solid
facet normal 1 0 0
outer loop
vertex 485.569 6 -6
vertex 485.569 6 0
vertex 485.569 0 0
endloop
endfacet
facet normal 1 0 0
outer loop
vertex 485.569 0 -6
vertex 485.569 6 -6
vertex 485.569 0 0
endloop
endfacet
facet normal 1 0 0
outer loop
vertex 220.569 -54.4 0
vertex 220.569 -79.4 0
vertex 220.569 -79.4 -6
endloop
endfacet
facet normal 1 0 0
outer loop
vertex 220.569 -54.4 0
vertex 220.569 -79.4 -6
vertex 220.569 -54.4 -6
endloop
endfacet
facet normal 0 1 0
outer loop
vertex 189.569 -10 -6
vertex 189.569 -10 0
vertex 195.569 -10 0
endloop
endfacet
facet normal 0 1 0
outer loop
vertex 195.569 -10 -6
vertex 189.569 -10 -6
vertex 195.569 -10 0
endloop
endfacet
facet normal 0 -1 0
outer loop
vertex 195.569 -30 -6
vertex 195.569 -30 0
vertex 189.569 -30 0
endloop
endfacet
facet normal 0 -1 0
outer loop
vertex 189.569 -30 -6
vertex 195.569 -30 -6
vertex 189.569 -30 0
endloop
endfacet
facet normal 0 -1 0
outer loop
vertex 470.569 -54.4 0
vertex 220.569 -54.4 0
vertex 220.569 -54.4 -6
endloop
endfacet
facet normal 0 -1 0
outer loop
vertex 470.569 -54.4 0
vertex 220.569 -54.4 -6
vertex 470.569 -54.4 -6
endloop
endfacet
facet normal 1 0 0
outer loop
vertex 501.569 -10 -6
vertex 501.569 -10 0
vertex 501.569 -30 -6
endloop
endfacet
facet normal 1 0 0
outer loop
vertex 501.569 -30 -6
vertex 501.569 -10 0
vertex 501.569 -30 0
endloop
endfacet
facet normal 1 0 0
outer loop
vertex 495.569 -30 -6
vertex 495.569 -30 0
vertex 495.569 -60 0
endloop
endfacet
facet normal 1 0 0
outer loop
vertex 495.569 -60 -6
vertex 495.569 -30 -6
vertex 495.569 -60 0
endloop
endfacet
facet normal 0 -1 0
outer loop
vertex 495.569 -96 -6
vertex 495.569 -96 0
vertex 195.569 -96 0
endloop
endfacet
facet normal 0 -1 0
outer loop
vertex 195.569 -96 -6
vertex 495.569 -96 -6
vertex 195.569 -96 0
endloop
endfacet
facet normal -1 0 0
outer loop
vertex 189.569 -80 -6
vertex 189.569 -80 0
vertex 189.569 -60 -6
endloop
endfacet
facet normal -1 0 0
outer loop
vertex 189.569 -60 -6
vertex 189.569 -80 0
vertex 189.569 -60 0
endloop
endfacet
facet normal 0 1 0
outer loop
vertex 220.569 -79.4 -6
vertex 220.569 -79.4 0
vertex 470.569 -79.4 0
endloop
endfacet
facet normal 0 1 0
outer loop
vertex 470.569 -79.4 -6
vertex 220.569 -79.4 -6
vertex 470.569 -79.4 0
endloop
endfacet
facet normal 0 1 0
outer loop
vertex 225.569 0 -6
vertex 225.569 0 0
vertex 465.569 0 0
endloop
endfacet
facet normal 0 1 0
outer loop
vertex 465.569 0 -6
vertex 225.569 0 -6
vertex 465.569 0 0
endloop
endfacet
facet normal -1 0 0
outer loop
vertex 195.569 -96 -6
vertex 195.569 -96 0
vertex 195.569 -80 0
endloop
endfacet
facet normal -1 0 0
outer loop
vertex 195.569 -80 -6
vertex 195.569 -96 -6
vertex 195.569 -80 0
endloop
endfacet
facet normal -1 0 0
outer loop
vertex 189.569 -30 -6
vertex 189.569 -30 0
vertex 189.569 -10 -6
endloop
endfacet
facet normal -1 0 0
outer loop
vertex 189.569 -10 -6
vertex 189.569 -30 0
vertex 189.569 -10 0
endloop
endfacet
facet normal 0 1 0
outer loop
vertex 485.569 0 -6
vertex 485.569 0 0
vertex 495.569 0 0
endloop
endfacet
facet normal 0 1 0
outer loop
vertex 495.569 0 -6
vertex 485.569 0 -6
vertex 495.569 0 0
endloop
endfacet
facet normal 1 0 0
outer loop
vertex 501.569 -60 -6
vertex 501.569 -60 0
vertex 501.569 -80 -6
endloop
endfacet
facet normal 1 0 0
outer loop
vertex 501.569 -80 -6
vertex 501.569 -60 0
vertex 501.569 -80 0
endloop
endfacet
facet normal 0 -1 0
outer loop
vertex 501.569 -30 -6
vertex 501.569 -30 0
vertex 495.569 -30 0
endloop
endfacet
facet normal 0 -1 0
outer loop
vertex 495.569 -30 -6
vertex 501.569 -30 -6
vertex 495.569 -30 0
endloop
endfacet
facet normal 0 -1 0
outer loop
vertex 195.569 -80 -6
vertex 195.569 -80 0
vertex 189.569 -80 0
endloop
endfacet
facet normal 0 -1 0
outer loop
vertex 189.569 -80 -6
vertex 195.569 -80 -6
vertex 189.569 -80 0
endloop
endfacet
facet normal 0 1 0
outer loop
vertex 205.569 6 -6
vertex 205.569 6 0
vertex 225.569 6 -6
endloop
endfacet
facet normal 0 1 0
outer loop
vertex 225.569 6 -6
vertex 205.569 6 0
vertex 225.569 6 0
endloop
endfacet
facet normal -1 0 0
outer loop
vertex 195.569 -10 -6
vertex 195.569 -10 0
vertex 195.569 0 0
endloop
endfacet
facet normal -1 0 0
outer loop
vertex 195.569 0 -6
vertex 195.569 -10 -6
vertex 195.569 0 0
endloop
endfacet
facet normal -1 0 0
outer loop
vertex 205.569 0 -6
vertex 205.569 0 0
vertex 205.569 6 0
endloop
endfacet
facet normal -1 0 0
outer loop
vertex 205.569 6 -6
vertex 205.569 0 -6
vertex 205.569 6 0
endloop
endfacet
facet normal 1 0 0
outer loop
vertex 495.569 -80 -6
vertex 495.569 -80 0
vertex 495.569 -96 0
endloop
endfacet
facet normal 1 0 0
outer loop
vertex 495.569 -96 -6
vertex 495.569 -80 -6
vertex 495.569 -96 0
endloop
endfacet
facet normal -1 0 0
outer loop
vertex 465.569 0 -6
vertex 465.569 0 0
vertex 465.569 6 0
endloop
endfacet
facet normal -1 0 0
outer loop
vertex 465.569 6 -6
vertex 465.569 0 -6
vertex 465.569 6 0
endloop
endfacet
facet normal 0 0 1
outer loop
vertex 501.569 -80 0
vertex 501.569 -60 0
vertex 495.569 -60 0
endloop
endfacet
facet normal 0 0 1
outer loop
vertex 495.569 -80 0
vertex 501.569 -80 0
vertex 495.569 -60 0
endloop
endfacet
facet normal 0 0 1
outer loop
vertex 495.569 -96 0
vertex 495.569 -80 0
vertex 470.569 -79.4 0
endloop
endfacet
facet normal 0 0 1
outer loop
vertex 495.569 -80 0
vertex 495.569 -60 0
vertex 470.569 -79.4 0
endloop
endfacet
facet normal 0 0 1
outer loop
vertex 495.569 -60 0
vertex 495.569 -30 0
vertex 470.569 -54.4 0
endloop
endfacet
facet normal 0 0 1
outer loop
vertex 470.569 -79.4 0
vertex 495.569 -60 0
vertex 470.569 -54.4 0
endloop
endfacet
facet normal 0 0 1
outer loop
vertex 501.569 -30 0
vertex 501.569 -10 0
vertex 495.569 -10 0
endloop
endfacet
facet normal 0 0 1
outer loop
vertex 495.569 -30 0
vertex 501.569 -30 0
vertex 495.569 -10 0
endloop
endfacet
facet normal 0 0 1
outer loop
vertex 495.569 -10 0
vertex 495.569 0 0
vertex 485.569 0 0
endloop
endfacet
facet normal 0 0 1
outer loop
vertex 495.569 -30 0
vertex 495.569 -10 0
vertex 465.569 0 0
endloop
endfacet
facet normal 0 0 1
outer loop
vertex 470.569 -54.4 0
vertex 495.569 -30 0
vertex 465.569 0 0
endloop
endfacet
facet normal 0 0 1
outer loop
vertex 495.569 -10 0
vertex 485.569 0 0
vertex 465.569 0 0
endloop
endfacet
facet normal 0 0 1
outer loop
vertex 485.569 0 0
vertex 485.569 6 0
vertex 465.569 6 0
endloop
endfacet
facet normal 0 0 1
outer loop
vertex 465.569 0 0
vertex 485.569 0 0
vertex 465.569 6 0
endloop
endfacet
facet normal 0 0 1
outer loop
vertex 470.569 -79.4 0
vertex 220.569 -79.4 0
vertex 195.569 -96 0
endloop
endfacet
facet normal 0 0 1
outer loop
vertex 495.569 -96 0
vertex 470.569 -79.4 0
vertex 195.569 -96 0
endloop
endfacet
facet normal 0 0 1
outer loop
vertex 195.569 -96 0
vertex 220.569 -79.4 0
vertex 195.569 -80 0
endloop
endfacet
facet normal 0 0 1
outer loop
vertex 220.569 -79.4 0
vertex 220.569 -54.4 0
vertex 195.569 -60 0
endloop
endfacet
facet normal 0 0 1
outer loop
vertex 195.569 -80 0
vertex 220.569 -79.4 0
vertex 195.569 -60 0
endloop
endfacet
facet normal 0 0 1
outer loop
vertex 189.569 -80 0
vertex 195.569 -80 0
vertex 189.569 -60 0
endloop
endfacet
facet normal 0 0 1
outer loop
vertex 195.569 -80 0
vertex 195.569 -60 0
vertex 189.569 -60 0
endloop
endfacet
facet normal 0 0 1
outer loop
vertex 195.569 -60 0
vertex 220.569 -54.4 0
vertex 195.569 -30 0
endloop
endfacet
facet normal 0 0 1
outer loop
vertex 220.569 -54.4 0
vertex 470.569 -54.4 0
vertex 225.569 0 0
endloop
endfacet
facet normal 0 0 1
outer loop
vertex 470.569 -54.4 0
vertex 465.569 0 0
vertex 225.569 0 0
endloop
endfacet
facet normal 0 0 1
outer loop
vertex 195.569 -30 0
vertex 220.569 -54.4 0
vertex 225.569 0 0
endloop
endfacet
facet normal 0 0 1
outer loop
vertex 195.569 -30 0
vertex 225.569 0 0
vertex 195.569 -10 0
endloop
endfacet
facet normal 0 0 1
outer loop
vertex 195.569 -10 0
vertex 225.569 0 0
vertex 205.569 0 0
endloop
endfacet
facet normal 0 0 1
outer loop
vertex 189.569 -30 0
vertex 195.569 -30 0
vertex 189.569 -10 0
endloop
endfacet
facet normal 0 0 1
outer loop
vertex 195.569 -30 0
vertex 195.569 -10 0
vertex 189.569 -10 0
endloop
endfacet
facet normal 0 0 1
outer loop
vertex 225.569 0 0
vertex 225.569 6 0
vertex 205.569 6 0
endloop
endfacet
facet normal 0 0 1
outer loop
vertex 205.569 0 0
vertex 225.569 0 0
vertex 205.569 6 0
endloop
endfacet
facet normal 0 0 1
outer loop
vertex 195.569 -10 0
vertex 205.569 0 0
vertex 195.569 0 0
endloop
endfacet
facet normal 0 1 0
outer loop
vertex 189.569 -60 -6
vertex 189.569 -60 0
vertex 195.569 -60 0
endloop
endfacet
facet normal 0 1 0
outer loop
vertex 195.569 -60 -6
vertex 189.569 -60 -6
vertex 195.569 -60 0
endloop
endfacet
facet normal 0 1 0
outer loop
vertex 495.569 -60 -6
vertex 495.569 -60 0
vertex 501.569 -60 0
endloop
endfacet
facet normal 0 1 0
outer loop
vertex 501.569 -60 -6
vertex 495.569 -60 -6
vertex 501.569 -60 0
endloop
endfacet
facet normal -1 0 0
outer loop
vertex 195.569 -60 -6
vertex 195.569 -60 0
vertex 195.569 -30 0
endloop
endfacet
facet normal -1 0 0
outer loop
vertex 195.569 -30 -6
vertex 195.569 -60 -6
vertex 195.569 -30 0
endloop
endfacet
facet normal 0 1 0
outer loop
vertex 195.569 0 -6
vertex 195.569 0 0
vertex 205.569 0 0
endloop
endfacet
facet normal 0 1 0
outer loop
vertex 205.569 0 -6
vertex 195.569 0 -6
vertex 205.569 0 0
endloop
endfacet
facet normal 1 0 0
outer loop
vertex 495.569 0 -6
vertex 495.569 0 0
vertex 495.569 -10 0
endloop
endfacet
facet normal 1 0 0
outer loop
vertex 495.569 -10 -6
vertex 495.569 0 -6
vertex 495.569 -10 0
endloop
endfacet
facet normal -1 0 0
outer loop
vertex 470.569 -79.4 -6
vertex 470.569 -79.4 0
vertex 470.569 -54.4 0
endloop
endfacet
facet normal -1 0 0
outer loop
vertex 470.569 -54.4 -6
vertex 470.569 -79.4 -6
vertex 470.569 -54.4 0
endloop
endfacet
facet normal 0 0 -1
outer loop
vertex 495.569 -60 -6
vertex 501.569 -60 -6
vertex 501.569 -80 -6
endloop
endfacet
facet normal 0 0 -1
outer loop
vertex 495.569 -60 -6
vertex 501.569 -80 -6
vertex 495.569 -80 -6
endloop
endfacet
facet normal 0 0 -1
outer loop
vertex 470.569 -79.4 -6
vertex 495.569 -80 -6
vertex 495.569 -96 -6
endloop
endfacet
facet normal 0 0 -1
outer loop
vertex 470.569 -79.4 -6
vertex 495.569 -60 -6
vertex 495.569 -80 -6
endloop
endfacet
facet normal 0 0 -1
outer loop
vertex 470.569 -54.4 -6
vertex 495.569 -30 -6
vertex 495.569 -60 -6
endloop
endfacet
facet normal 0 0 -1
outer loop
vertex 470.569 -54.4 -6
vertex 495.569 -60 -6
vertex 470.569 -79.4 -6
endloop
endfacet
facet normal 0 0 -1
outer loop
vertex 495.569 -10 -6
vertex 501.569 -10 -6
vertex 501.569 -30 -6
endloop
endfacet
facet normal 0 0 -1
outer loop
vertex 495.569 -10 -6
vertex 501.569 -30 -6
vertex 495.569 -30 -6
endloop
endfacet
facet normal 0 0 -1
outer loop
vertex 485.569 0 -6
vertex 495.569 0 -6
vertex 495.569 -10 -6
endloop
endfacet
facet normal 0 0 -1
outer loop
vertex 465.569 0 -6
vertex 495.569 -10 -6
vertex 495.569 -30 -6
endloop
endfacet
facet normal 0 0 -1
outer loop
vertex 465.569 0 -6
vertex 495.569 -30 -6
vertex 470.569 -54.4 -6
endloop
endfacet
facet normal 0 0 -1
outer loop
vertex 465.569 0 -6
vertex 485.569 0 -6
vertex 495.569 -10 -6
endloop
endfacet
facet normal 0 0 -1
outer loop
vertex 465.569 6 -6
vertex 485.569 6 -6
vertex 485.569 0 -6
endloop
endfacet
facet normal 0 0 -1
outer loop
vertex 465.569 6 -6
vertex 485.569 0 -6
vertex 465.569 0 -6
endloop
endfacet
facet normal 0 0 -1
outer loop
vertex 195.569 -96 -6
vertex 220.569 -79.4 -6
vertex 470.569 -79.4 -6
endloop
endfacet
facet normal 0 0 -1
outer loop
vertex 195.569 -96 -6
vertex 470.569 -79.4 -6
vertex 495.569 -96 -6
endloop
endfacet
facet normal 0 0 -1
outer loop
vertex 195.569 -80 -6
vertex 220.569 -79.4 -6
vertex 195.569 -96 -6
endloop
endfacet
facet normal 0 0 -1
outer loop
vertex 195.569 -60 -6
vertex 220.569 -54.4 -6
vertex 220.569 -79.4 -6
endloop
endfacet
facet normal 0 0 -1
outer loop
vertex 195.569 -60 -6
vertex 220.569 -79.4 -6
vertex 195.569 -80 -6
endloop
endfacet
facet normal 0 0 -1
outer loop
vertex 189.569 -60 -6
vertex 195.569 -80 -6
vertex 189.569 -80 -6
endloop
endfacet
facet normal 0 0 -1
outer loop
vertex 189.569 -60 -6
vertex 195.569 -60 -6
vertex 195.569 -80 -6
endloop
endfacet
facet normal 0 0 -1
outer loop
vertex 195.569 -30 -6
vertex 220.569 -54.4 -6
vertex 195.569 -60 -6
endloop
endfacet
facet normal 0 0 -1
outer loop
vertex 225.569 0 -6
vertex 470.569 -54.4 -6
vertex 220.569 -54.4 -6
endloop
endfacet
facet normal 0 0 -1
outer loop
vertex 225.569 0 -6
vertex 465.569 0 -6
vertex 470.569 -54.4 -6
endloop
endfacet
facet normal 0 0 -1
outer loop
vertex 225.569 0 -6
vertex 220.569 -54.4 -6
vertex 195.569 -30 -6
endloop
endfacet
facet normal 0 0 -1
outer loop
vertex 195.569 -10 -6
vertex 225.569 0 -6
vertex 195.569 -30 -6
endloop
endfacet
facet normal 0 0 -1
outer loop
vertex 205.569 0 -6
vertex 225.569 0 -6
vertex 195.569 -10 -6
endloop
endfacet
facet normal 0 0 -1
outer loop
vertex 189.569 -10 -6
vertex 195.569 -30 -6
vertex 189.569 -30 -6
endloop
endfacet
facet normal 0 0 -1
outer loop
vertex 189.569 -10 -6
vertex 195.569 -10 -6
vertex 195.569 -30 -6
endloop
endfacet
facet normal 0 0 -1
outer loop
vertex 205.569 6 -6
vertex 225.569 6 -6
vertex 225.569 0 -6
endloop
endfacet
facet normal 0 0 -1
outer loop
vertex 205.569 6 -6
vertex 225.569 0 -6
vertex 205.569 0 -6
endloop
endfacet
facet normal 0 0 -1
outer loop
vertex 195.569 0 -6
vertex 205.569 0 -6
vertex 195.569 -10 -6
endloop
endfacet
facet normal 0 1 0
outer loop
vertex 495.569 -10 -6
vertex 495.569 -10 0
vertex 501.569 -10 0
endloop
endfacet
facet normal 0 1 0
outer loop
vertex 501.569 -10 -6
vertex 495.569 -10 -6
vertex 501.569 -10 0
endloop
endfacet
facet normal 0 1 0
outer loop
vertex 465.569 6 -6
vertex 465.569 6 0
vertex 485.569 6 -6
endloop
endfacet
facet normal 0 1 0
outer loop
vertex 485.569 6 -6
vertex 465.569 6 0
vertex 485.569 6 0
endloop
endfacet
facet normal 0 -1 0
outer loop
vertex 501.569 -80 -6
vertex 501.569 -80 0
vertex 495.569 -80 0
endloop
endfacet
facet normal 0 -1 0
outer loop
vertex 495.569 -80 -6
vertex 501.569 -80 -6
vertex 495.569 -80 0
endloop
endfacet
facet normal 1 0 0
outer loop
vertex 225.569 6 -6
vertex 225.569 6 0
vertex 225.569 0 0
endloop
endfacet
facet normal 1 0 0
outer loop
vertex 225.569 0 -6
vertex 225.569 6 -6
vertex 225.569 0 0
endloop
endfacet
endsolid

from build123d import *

# Parameters (mm, degrees)
SKETCH1_W           = 250
SKETCH1_H           = 25
BOSS_EXTRUDE1_DEPTH = 6


with BuildPart() as part:
    # Sketch1 → Boss-Extrude1 (new body)
    with BuildSketch(Plane.XY):
        Polygon((495.568859933, -96.000000001), (195.568859933, -96.000000001), (195.568859933, -80.000000001), (189.568859933, -80.000000001), (189.568859933, -60.000000001), (195.568859933, -60.000000001), (195.568859933, -30.000000001), (189.568859933, -30.000000001), (189.568859933, -10.000000001), (195.568859933, -10.000000001), (195.568859933, 0), (205.568859933, 0), (205.568859933, 6), (225.568859933, 6), (225.568859933, 0), (465.568859933, 0), (465.568859933, 6), (485.568859933, 6), (485.568859933, 0), (495.568859933, 0), (495.568859933, -10), (501.568859933, -10), (501.568859933, -30), (495.568859933, -30), (495.568859933, -60), (501.568859933, -60), (501.568859933, -80), (495.568859933, -80), align=None)
        with Locations((345.568859933, -66.9)):
            Rectangle(SKETCH1_W, SKETCH1_H, mode=Mode.SUBTRACT)
    extrude(amount=-BOSS_EXTRUDE1_DEPTH)


solid = part.part
